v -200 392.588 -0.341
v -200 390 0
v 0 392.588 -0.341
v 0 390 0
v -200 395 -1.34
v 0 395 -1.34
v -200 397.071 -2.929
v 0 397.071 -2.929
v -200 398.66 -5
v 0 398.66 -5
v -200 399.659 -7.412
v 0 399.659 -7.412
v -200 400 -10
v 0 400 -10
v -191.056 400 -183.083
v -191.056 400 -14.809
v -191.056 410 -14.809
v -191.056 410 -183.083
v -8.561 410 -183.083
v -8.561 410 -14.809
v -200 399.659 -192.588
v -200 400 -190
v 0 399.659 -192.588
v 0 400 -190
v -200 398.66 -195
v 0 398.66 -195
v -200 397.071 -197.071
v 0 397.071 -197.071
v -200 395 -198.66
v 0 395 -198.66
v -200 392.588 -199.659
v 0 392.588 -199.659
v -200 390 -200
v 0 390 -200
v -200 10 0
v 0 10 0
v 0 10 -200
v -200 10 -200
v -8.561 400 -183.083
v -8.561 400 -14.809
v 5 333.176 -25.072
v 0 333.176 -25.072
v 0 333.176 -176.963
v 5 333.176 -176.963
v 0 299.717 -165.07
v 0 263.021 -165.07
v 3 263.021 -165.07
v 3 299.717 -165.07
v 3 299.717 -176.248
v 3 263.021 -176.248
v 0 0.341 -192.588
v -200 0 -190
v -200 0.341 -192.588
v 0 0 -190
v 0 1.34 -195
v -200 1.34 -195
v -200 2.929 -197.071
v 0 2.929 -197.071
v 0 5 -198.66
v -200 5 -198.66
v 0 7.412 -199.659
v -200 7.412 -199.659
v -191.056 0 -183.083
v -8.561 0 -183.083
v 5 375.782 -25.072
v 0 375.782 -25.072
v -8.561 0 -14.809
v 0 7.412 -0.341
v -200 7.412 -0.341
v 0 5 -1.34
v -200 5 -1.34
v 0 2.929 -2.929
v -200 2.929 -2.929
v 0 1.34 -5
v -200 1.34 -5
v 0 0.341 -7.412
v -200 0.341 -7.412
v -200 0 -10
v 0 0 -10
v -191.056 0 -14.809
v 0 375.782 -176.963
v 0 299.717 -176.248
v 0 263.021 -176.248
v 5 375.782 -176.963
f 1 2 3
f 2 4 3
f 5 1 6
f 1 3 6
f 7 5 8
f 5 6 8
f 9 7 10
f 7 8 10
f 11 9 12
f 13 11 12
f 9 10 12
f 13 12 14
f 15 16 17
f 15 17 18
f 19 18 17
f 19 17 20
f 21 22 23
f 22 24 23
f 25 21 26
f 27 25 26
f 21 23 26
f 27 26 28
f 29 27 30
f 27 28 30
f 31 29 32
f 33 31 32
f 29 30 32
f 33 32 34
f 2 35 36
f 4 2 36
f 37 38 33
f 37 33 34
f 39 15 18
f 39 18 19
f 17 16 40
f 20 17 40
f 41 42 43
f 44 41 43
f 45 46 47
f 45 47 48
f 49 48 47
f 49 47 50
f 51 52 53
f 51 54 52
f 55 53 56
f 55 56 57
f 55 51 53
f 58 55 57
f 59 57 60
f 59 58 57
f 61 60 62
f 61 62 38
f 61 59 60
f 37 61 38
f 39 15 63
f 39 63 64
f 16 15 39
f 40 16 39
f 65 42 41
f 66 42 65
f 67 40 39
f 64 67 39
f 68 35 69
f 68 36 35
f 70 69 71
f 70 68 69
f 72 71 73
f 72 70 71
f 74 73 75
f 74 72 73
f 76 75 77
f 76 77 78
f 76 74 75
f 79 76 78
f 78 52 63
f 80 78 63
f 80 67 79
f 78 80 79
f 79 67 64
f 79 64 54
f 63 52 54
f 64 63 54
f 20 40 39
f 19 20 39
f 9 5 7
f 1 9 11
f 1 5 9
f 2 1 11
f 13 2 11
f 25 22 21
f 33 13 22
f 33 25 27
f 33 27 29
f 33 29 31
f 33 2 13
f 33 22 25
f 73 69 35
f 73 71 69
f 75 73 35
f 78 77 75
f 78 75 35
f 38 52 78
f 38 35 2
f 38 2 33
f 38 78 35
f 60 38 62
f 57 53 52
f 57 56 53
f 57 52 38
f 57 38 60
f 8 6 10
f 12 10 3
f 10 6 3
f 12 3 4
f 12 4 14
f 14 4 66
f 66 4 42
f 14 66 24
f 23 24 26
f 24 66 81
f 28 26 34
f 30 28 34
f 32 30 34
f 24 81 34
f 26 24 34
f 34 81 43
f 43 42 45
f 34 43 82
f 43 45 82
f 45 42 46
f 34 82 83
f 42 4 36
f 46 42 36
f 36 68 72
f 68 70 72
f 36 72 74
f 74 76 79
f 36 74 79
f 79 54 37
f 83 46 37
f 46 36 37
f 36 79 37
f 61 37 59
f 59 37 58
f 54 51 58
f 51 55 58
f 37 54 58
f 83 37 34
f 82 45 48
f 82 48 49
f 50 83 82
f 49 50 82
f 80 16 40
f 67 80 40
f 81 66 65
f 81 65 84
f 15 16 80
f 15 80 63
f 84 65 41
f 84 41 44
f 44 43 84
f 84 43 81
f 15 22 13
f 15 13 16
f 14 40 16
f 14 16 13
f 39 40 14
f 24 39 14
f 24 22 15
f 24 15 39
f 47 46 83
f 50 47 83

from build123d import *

# Parameters (mm, degrees)
SKETCH1_W           = 200
SKETCH1_H           = 200
BOSS_EXTRUDE1_DEPTH = 400
FILLET1_R           = 10
FILLET2_R           = 10
FILLET3_R           = 10
FILLET4_R           = 10
SKETCH2_W           = 151.890786039
SKETCH2_H           = 42.605964066
BOSS_EXTRUDE2_DEPTH = 5
SKETCH3_W           = 11.177888606
SKETCH3_H           = 36.695974833
BOSS_EXTRUDE3_DEPTH = 3
SKETCH4_W           = 182.495130058
SKETCH4_H           = 168.274128296
CUT_EXTRUDE1_DEPTH  = 350
SKETCH5_W           = 182.495130058
SKETCH5_H           = 168.274128296
CUT_EXTRUDE2_DEPTH  = 175
SKETCH6_W           = 182.495130058
SKETCH6_H           = 168.274128296
BOSS_EXTRUDE4_DEPTH = 10


with BuildPart() as part:
    # Sketch1 → Boss-Extrude1 (new body)
    with BuildSketch(Plane(origin=(0, 0, 0), x_dir=(1, 0, 0), z_dir=(0, 1, 0))):
        with Locations((-100, 100)):
            Rectangle(SKETCH1_W, SKETCH1_H)
    extrude(amount=BOSS_EXTRUDE1_DEPTH)

    # Fillet1
    fillet1_edges = [part.edges().sort_by_distance(p)[0] for p in [
        (-100, 400, 0),
    ]]
    fillet(fillet1_edges, radius=FILLET1_R)

    # Fillet2
    fillet2_edges = [part.edges().sort_by_distance(p)[0] for p in [
        (-100, 400, -200),
    ]]
    fillet(fillet2_edges, radius=FILLET2_R)

    # Fillet3
    fillet3_edges = [part.edges().sort_by_distance(p)[0] for p in [
        (-100, 0, 0),
    ]]
    fillet(fillet3_edges, radius=FILLET3_R)

    # Fillet4
    fillet4_edges = [part.edges().sort_by_distance(p)[0] for p in [
        (-100, 0, -200),
    ]]
    fillet(fillet4_edges, radius=FILLET4_R)

    # Sketch2 → Boss-Extrude2 (add)
    with BuildSketch(Plane(origin=(0, 0, 0), x_dir=(0, 0, -1), z_dir=(1, 0, 0))):
        with Locations((101.017573134, 354.479134096)):
            Rectangle(SKETCH2_W, SKETCH2_H)
    extrude(amount=BOSS_EXTRUDE2_DEPTH)

    # Sketch3 → Boss-Extrude3 (add)
    with BuildSketch(Plane(origin=(0, 0, 0), x_dir=(0, 0, -1), z_dir=(1, 0, 0))):
        with Locations((170.659301247, 281.368641249)):
            Rectangle(SKETCH3_W, SKETCH3_H)
    extrude(amount=BOSS_EXTRUDE3_DEPTH)

    # Sketch4 → Cut-Extrude1 (cut)
    with BuildSketch(Plane(origin=(0, 400, 0), x_dir=(1, 0, 0), z_dir=(0, 1, 0))):
        with Locations((-99.808413428, 98.946230153)):
            Rectangle(SKETCH4_W, SKETCH4_H)
    extrude(amount=-CUT_EXTRUDE1_DEPTH, mode=Mode.SUBTRACT)

    # Sketch5 → Cut-Extrude2 (cut)
    with BuildSketch(Plane(origin=(0, 50, 0), x_dir=(1, 0, 0), z_dir=(0, 1, 0))):
        with Locations((-99.808413428, 98.946230153)):
            Rectangle(SKETCH5_W, SKETCH5_H)
    extrude(amount=-CUT_EXTRUDE2_DEPTH, mode=Mode.SUBTRACT)


with BuildPart() as body_2:
    # Sketch6 → Boss-Extrude4 (new body)
    with BuildSketch(Plane(origin=(0, 400, 0), x_dir=(1, 0, 0), z_dir=(0, 1, 0))):
        with Locations((-99.808413428, 98.946230153)):
            Rectangle(SKETCH6_W, SKETCH6_H)
    extrude(amount=BOSS_EXTRUDE4_DEPTH)


solid = Compound([part.part, body_2.part])
